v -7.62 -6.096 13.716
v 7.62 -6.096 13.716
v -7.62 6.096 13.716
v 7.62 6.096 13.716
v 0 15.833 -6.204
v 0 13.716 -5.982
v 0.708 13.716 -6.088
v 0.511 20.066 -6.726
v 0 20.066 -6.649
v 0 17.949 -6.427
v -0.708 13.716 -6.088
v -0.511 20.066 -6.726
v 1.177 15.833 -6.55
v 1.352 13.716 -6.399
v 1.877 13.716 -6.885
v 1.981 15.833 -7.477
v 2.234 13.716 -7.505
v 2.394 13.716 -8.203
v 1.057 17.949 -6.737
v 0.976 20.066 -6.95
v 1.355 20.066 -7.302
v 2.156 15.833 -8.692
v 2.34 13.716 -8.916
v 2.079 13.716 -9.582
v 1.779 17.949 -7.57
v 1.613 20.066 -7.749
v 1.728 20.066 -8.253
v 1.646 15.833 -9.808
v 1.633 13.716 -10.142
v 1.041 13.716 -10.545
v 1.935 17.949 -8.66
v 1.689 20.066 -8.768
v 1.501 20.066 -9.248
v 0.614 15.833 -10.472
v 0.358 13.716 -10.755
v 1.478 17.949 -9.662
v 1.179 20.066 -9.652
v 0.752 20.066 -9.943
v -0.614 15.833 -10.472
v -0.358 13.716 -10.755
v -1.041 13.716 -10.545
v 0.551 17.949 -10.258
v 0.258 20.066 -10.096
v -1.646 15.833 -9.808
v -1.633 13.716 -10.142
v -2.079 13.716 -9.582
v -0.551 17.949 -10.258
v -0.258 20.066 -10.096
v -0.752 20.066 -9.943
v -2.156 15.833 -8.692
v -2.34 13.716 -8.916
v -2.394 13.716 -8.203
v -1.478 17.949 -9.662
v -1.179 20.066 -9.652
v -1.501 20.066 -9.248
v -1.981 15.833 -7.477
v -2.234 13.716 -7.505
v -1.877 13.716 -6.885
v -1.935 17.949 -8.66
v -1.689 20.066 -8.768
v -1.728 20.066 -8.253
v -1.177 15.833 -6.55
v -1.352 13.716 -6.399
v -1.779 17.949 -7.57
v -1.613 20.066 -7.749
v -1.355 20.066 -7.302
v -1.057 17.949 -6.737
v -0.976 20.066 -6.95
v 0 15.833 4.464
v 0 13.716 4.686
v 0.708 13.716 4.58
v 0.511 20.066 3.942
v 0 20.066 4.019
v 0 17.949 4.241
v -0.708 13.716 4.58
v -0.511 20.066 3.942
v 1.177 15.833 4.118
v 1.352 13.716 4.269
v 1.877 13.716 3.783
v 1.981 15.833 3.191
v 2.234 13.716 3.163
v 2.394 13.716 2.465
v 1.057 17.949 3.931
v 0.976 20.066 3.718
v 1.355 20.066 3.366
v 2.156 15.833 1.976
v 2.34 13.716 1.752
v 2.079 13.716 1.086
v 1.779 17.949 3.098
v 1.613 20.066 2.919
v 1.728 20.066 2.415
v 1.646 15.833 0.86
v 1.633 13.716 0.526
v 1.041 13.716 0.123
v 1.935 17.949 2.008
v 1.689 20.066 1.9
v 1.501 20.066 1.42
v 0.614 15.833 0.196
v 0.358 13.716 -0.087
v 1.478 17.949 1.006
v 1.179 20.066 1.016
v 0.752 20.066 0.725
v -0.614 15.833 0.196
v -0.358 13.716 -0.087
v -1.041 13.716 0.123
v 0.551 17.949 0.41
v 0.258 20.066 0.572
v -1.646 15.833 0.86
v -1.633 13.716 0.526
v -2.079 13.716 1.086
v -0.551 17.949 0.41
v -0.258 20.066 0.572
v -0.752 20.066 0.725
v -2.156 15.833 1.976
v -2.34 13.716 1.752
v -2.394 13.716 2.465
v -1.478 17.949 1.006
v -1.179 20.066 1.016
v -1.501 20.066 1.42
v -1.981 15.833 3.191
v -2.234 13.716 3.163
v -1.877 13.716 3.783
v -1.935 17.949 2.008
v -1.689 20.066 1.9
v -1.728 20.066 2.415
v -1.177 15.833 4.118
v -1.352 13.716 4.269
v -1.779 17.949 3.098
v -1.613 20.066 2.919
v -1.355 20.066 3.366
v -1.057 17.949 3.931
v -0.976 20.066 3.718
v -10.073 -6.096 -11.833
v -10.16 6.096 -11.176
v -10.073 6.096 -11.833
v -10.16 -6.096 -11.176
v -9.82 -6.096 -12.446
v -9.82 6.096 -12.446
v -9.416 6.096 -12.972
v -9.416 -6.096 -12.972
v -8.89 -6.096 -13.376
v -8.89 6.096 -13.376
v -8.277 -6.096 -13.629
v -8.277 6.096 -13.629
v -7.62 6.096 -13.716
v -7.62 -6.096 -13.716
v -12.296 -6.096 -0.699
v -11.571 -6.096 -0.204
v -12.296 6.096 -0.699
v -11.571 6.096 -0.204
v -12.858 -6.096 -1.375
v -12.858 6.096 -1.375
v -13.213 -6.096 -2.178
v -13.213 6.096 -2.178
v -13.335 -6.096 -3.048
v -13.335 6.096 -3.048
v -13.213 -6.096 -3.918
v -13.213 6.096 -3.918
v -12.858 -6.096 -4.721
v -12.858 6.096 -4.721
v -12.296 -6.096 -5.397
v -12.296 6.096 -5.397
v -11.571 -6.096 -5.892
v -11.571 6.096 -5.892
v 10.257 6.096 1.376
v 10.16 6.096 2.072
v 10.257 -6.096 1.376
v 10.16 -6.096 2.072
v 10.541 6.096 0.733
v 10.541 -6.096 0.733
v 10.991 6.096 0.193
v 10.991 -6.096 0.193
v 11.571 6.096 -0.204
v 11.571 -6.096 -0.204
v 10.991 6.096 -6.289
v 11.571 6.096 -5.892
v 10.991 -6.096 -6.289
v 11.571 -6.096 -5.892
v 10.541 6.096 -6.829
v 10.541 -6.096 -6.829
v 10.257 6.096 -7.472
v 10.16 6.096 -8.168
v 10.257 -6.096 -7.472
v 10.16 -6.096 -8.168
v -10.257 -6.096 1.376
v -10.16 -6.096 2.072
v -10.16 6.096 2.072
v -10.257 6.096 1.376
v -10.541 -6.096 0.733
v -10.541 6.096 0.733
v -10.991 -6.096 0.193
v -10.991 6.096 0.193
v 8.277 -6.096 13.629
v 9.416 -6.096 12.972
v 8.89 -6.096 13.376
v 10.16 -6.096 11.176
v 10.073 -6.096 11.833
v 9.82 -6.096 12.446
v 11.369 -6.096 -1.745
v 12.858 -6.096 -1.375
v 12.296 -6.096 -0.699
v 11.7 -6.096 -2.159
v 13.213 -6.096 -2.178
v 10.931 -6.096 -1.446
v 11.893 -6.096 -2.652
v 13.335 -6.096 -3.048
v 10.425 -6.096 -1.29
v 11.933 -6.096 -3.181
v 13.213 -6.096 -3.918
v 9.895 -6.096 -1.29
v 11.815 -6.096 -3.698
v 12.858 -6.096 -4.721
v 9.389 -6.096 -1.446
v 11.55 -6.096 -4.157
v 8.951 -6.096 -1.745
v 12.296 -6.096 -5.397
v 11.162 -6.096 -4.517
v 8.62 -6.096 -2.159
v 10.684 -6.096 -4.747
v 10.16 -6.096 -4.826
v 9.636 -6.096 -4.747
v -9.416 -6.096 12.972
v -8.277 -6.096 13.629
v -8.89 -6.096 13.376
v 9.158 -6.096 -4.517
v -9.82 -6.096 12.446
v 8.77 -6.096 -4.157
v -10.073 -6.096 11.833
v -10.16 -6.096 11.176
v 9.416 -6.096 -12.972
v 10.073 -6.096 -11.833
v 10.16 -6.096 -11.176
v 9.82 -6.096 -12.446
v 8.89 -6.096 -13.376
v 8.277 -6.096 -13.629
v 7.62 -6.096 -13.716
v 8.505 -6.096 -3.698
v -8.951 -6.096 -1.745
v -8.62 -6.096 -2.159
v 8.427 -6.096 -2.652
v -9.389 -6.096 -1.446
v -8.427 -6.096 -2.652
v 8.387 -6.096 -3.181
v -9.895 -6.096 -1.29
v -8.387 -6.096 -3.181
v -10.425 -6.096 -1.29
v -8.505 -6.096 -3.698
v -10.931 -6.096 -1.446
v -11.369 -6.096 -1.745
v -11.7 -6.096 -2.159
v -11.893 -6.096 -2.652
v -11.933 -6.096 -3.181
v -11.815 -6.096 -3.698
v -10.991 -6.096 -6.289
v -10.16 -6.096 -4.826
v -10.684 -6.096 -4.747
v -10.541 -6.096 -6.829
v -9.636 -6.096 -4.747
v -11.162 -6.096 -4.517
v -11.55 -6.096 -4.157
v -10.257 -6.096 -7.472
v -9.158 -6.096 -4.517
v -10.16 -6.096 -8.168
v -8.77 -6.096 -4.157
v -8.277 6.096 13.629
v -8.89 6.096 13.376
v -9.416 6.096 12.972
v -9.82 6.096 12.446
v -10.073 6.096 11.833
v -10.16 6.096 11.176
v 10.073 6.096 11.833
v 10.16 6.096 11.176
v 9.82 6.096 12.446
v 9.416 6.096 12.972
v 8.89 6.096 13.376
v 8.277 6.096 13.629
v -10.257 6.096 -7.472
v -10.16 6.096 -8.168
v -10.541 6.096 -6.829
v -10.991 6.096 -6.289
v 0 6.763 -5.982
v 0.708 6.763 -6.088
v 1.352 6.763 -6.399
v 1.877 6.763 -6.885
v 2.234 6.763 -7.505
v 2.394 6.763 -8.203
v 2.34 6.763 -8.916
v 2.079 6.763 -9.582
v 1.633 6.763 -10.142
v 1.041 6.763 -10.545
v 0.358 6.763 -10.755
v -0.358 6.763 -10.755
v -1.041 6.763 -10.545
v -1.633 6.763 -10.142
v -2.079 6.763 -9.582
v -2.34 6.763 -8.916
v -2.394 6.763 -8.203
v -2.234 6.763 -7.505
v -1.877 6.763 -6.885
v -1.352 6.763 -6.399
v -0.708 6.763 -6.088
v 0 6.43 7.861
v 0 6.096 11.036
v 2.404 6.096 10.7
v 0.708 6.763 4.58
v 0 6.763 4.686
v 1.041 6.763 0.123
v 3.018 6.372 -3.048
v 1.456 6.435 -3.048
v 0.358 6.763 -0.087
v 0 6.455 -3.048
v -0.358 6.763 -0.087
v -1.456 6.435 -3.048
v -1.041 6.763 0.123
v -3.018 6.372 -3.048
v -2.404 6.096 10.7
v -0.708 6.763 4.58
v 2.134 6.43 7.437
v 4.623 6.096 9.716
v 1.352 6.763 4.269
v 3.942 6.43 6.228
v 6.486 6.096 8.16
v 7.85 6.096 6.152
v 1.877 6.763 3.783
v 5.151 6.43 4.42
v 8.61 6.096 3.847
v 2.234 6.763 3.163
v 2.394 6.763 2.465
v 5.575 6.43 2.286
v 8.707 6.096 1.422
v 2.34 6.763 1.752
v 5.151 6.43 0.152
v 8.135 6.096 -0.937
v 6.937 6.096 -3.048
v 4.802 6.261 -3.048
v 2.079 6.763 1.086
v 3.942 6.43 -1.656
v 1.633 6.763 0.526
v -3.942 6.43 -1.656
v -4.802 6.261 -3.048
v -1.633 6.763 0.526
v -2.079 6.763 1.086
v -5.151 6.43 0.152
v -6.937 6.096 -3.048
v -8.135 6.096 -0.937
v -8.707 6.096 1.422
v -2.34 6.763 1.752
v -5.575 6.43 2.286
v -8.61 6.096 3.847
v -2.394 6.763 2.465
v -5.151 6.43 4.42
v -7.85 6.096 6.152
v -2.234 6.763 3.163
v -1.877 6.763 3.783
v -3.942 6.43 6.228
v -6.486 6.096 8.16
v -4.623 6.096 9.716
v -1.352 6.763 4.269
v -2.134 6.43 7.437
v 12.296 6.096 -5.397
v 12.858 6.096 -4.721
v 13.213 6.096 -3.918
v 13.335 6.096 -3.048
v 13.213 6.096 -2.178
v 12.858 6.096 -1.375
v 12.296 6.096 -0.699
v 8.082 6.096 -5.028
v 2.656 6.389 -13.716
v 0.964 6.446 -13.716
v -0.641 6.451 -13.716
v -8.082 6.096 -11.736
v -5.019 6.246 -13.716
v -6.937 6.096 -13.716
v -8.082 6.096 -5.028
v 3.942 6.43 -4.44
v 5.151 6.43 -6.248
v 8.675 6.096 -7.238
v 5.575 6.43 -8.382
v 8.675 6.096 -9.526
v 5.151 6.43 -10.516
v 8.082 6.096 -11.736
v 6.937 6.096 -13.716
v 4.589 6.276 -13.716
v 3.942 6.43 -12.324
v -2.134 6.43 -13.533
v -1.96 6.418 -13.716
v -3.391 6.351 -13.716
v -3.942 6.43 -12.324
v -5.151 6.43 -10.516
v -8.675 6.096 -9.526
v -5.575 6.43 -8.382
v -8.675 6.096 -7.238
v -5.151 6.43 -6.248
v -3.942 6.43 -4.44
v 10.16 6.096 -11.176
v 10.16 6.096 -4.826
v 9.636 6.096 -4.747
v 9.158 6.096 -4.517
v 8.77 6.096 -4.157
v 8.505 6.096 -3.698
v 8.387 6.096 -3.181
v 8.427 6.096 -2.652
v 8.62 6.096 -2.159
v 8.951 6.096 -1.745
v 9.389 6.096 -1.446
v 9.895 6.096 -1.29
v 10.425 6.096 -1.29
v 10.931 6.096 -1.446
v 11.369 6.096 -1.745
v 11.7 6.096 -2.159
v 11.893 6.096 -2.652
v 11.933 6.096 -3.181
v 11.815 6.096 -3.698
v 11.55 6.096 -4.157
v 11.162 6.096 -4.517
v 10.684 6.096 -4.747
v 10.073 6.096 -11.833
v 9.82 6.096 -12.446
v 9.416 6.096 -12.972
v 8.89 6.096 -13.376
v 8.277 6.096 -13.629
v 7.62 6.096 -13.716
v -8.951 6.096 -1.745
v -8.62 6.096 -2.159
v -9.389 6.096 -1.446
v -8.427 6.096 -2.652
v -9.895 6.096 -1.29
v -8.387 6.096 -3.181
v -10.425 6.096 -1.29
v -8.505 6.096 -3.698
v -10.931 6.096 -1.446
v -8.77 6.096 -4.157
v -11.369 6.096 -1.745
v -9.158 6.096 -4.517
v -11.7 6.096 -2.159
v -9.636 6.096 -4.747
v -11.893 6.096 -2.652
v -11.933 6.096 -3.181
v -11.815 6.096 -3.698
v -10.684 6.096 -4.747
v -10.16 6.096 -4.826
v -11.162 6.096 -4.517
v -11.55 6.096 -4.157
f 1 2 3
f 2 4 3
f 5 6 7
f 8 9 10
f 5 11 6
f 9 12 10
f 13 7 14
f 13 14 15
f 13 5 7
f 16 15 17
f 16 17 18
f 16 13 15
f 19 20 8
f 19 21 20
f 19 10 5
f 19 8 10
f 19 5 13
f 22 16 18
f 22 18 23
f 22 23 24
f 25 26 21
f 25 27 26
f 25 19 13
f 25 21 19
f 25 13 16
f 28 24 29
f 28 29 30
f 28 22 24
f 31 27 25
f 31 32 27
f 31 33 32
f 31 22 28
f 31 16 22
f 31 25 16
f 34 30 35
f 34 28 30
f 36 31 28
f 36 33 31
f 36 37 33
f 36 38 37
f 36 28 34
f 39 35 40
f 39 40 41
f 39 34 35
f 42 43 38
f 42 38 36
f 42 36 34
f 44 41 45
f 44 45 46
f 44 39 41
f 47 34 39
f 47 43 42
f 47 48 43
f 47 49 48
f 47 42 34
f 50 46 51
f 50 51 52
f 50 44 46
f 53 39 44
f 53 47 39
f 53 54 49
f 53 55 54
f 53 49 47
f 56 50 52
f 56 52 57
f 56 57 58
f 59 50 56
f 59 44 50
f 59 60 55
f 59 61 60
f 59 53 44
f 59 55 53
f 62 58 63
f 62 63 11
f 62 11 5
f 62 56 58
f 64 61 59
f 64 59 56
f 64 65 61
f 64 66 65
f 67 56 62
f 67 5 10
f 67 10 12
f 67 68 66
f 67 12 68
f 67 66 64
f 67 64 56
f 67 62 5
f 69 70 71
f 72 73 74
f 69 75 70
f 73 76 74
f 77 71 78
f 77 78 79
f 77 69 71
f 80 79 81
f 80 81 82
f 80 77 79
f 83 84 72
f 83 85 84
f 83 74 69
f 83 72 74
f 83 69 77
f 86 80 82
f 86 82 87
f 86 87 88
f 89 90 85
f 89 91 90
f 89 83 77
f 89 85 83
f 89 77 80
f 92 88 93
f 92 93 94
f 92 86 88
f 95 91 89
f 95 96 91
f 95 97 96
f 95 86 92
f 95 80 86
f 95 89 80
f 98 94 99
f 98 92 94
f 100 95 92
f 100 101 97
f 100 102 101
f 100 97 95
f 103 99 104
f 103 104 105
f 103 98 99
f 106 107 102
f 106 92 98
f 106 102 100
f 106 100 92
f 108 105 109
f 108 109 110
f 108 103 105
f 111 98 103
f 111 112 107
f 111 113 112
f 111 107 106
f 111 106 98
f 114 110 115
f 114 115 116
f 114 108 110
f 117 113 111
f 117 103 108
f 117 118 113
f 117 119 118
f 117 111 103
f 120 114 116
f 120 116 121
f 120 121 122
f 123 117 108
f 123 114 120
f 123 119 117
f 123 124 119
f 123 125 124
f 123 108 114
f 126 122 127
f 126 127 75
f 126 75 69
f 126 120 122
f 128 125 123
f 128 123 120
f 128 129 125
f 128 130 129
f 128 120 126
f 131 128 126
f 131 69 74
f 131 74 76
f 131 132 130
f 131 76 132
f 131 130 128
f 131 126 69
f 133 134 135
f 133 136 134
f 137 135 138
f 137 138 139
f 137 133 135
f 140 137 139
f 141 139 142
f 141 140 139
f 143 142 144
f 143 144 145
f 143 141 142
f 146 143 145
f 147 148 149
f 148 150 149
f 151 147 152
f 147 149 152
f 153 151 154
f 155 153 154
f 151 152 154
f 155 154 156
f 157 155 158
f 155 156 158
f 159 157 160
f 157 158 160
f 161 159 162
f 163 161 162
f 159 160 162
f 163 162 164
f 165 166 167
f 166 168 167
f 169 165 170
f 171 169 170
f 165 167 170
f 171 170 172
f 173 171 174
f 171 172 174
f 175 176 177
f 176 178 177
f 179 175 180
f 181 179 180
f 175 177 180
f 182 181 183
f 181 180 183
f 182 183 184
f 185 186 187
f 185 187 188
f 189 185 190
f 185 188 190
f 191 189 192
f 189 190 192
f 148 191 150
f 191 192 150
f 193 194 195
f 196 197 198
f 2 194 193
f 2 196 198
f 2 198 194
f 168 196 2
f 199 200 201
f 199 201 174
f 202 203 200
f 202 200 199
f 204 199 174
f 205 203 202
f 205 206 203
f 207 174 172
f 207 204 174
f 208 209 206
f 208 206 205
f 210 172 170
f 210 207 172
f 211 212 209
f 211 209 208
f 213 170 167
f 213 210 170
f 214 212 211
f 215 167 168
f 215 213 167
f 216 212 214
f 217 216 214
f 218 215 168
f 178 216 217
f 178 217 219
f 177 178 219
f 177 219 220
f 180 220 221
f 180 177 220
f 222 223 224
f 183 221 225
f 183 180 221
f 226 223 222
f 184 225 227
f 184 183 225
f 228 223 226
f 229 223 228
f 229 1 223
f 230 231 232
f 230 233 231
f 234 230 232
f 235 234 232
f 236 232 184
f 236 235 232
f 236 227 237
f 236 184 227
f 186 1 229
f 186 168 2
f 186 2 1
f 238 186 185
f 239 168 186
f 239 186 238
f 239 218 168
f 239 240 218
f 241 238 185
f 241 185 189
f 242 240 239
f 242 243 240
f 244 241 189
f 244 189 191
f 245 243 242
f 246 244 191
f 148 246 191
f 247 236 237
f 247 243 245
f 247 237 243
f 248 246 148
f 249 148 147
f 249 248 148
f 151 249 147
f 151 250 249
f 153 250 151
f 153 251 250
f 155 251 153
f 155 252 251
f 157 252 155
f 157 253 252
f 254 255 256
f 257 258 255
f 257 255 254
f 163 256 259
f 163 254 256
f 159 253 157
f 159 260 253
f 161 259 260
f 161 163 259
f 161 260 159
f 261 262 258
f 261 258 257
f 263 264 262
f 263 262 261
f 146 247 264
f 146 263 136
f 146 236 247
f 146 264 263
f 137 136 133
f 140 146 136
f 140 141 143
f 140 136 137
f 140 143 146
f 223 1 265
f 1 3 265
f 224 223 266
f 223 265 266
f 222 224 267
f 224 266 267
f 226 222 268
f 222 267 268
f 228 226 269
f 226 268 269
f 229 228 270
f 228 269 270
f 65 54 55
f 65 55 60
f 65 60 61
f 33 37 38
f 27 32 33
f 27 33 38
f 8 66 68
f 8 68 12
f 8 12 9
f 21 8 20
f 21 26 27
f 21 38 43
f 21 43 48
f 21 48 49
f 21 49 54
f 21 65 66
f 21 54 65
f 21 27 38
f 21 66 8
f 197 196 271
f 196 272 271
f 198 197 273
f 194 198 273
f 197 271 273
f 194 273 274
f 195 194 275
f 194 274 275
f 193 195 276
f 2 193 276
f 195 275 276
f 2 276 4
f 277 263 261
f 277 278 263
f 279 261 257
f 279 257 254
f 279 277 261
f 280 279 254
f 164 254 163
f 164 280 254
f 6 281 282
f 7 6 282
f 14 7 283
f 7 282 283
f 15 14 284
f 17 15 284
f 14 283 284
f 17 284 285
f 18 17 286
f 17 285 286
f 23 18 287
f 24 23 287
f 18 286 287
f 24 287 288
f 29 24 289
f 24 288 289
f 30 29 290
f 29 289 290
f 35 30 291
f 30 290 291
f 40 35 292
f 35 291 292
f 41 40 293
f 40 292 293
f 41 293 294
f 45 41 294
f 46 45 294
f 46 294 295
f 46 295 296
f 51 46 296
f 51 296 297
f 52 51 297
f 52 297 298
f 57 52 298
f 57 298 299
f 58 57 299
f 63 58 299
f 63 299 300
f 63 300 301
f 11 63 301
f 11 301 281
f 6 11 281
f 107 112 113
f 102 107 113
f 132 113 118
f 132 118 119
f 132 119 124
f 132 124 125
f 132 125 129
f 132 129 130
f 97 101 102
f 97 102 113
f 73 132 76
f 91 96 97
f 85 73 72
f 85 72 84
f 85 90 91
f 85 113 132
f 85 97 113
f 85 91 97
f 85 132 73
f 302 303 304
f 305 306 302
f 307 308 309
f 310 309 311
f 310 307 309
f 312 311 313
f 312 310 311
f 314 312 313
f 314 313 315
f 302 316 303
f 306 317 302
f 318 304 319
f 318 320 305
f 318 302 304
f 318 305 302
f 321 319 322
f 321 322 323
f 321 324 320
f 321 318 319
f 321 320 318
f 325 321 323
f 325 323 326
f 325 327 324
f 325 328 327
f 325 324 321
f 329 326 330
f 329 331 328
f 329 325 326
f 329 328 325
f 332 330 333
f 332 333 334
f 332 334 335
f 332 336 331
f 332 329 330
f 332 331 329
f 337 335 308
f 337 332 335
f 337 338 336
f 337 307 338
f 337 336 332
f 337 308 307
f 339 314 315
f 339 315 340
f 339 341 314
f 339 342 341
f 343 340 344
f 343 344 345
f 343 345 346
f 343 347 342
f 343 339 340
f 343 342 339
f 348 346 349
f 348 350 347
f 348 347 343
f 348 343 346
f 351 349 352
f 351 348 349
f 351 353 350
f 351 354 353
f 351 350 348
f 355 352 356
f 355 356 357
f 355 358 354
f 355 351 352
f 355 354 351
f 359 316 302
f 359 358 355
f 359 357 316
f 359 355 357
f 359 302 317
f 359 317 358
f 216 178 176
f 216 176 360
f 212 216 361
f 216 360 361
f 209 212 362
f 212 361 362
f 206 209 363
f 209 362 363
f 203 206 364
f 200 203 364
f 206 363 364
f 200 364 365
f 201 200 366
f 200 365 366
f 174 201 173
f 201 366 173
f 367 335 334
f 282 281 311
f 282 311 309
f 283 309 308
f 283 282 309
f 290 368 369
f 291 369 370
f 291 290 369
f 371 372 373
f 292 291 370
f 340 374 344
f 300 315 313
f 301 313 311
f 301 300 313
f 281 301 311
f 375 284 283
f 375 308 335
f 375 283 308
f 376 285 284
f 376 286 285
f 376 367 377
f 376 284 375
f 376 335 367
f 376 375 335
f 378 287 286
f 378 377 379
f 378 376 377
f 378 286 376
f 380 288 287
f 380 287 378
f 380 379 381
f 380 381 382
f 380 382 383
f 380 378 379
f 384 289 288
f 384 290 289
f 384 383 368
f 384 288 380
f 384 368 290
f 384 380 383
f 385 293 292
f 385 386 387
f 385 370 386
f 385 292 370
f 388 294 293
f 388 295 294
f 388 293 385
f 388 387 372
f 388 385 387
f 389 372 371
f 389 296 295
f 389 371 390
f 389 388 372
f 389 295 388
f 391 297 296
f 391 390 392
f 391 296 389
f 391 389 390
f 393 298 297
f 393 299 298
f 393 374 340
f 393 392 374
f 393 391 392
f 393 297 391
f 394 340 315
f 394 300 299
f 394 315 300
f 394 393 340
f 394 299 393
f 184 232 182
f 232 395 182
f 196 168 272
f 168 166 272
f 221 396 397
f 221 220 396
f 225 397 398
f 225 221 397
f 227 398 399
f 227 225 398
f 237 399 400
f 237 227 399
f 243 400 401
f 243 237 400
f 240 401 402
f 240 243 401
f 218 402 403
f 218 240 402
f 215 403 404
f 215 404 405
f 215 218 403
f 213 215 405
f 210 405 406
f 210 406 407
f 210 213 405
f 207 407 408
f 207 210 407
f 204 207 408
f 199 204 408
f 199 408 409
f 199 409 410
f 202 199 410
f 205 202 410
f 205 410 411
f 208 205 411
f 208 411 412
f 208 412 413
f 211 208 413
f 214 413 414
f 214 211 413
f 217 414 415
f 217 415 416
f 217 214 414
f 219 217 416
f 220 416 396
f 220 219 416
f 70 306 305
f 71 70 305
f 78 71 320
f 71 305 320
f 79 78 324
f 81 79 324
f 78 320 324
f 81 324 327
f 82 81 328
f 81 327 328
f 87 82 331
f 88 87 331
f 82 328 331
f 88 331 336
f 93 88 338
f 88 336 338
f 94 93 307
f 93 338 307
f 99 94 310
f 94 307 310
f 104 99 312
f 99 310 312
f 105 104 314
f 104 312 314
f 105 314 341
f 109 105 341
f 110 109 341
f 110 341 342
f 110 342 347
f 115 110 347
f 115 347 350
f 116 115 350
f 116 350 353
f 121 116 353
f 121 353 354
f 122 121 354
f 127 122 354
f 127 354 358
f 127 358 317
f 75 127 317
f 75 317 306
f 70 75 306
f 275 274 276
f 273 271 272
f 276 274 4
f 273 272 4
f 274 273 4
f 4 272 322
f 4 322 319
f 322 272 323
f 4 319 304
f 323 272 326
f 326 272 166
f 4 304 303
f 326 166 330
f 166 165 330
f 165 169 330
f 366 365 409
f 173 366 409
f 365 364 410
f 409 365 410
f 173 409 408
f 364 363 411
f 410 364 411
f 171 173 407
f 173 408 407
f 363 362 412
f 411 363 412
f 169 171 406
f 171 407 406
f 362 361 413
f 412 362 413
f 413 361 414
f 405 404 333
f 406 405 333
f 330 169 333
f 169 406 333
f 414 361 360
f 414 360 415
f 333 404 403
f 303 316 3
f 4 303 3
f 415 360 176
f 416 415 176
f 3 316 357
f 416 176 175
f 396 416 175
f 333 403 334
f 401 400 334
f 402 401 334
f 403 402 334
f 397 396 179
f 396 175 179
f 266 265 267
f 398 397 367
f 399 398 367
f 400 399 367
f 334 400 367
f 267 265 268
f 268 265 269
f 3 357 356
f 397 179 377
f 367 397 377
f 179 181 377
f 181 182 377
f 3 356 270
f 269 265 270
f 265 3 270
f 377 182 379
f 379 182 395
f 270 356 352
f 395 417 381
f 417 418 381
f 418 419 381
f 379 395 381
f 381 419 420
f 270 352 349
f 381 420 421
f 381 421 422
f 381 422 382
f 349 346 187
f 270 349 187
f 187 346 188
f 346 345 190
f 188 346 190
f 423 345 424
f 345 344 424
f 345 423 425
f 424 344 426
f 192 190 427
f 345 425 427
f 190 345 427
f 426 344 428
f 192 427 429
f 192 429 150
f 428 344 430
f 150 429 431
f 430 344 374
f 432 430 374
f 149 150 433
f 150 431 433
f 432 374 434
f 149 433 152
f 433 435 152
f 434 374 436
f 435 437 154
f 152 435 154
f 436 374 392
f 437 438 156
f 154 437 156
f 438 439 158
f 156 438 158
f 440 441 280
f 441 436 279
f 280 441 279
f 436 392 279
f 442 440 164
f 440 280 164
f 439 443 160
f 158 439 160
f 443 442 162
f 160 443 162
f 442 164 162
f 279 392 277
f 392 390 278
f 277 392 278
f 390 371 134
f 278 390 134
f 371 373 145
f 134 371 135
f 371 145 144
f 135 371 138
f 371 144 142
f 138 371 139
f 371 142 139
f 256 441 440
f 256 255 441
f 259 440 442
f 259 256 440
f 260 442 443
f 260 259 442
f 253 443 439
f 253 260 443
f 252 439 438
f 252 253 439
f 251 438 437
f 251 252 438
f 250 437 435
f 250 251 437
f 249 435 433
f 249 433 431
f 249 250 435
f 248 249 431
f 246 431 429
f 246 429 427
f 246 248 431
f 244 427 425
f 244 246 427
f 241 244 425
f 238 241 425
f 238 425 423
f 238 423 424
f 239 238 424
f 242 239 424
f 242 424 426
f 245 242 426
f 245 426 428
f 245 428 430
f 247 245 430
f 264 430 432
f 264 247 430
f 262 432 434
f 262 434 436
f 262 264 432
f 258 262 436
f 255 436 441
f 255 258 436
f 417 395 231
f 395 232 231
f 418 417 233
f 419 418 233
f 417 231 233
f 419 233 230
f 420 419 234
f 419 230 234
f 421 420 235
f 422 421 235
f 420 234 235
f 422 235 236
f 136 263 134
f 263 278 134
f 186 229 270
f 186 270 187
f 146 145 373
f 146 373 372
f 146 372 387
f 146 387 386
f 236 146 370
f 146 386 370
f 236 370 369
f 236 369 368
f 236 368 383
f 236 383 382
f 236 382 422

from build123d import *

# Parameters (mm, degrees)
SKETCH1_R           = 1.778
BOSS_EXTRUDE1_DEPTH = 6.096
FILLET1_R           = 2.54
SKETCH2_R           = 2.4003
BOSS_EXTRUDE2_DEPTH = 13.97
CHAMFER1_SIZE       = 6.35
CHAMFER1_SIZE_2     = 0.667411894


with BuildPart() as part:
    # Sketch1 → Boss-Extrude1 (new, symmetric)
    with BuildSketch(Plane(origin=(0, 0, 0), x_dir=(1, 0, 0), z_dir=(0, 1, 0))):
        with BuildLine():
            Line((-10.16, 6.223), (-10.16, 13.716))
            Line((-10.16, 13.716), (10.16, 13.716))
            Line((10.16, 13.716), (10.16, 6.223))
            ThreePointArc((10.16, 6.223), (13.335, 3.048), (10.16, -0.127))
            Line((10.16, -0.127), (10.16, -13.716))
            Line((10.16, -13.716), (-10.16, -13.716))
            Line((-10.16, -13.716), (-10.16, -0.127))
            ThreePointArc((-10.16, -0.127), (-13.335, 3.048), (-10.16, 6.223))
        make_face()
        with Locations(Location((-10.16, 3.048, 0), (0, 0, 90))):
            Circle(SKETCH1_R, mode=Mode.SUBTRACT)
        with Locations(Location((10.16, 3.048, 0), (0, 0, 90))):
            Circle(SKETCH1_R, mode=Mode.SUBTRACT)
    extrude(amount=BOSS_EXTRUDE1_DEPTH, both=True)

    # Fillet1
    fillet1_edges = [part.edges().sort_by_distance(p)[0] for p in [
        (10.16, 0, -6.223),
        (10.16, 0, 0.127),
        (10.16, 0, 13.716),
        (-10.16, 0, 13.716),
        (-10.16, 0, 0.127),
        (-10.16, 0, -6.223),
        (-10.16, 0, -13.716),
        (10.16, 0, -13.716),
    ]]
    fillet(fillet1_edges, radius=FILLET1_R)

    # Sketch2 → Boss-Extrude2 (add)
    with BuildSketch(Plane(origin=(0, 6.096, 0), x_dir=(1, 0, 0), z_dir=(0, 1, 0))):
        with Locations(Location((0, 8.382, 0), (0, 0, 270))):
            Circle(SKETCH2_R)
        with Locations(Location((0, -2.286, 0), (0, 0, 270))):
            Circle(SKETCH2_R)
    extrude(amount=BOSS_EXTRUDE2_DEPTH)

    # Chamfer1
    # the kernel refuses this chamfer: 6.35, 0.667411894 mm, written as the material it adds along each edge
    with BuildSketch(Plane(origin=(0, 6.096, -8.382), x_dir=(0, 0, 1), z_dir=(-1, 0, 0))) as chamfer1_piece_1_section:
        Polygon((2.4003 + CHAMFER1_SIZE, 0), (2.4003, CHAMFER1_SIZE_2), (2.4003, 0), align=None)
    chamfer1_piece_1 = revolve(axis=Axis((0, 6.096, -8.382), (0, 1, 0)), mode=Mode.PRIVATE)
    chamfer1_piece_1 = split(chamfer1_piece_1, bisect_by=Plane(origin=(6.803322578, 6.146034246, -13.716), z_dir=(0, 0, 1)), keep=Keep.TOP, mode=Mode.PRIVATE)
    add(chamfer1_piece_1)
    with BuildSketch(Plane(origin=(0, 6.096, 2.286), x_dir=(0, 0, 1), z_dir=(-1, 0, 0))) as chamfer1_piece_2:
        Polygon((2.4003 + CHAMFER1_SIZE, 0), (2.4003, CHAMFER1_SIZE_2), (2.4003, 0), align=None)
    revolve(axis=Axis((0, 6.096, 2.286), (0, 1, 0)))
    # the kernel refuses this chamfer: 6.35, 0.667411894 mm, written as the material it takes off along each edge
    with BuildSketch(Plane(origin=(0, 20.066, -8.382), x_dir=(0, 0, 1), z_dir=(-1, 0, 0))) as chamfer1_2_piece_1:
        Polygon((2.4003, -CHAMFER1_SIZE), (2.4003 - CHAMFER1_SIZE_2, 0), (2.4003, 0), align=None)
    revolve(axis=Axis((0, 20.066, -8.382), (0, 1, 0)), mode=Mode.SUBTRACT)
    with BuildSketch(Plane(origin=(0, 20.066, 2.286), x_dir=(0, 0, 1), z_dir=(-1, 0, 0))) as chamfer1_2_piece_2:
        Polygon((2.4003, -CHAMFER1_SIZE), (2.4003 - CHAMFER1_SIZE_2, 0), (2.4003, 0), align=None)
    revolve(axis=Axis((0, 20.066, 2.286), (0, 1, 0)), mode=Mode.SUBTRACT)


solid = part.part
